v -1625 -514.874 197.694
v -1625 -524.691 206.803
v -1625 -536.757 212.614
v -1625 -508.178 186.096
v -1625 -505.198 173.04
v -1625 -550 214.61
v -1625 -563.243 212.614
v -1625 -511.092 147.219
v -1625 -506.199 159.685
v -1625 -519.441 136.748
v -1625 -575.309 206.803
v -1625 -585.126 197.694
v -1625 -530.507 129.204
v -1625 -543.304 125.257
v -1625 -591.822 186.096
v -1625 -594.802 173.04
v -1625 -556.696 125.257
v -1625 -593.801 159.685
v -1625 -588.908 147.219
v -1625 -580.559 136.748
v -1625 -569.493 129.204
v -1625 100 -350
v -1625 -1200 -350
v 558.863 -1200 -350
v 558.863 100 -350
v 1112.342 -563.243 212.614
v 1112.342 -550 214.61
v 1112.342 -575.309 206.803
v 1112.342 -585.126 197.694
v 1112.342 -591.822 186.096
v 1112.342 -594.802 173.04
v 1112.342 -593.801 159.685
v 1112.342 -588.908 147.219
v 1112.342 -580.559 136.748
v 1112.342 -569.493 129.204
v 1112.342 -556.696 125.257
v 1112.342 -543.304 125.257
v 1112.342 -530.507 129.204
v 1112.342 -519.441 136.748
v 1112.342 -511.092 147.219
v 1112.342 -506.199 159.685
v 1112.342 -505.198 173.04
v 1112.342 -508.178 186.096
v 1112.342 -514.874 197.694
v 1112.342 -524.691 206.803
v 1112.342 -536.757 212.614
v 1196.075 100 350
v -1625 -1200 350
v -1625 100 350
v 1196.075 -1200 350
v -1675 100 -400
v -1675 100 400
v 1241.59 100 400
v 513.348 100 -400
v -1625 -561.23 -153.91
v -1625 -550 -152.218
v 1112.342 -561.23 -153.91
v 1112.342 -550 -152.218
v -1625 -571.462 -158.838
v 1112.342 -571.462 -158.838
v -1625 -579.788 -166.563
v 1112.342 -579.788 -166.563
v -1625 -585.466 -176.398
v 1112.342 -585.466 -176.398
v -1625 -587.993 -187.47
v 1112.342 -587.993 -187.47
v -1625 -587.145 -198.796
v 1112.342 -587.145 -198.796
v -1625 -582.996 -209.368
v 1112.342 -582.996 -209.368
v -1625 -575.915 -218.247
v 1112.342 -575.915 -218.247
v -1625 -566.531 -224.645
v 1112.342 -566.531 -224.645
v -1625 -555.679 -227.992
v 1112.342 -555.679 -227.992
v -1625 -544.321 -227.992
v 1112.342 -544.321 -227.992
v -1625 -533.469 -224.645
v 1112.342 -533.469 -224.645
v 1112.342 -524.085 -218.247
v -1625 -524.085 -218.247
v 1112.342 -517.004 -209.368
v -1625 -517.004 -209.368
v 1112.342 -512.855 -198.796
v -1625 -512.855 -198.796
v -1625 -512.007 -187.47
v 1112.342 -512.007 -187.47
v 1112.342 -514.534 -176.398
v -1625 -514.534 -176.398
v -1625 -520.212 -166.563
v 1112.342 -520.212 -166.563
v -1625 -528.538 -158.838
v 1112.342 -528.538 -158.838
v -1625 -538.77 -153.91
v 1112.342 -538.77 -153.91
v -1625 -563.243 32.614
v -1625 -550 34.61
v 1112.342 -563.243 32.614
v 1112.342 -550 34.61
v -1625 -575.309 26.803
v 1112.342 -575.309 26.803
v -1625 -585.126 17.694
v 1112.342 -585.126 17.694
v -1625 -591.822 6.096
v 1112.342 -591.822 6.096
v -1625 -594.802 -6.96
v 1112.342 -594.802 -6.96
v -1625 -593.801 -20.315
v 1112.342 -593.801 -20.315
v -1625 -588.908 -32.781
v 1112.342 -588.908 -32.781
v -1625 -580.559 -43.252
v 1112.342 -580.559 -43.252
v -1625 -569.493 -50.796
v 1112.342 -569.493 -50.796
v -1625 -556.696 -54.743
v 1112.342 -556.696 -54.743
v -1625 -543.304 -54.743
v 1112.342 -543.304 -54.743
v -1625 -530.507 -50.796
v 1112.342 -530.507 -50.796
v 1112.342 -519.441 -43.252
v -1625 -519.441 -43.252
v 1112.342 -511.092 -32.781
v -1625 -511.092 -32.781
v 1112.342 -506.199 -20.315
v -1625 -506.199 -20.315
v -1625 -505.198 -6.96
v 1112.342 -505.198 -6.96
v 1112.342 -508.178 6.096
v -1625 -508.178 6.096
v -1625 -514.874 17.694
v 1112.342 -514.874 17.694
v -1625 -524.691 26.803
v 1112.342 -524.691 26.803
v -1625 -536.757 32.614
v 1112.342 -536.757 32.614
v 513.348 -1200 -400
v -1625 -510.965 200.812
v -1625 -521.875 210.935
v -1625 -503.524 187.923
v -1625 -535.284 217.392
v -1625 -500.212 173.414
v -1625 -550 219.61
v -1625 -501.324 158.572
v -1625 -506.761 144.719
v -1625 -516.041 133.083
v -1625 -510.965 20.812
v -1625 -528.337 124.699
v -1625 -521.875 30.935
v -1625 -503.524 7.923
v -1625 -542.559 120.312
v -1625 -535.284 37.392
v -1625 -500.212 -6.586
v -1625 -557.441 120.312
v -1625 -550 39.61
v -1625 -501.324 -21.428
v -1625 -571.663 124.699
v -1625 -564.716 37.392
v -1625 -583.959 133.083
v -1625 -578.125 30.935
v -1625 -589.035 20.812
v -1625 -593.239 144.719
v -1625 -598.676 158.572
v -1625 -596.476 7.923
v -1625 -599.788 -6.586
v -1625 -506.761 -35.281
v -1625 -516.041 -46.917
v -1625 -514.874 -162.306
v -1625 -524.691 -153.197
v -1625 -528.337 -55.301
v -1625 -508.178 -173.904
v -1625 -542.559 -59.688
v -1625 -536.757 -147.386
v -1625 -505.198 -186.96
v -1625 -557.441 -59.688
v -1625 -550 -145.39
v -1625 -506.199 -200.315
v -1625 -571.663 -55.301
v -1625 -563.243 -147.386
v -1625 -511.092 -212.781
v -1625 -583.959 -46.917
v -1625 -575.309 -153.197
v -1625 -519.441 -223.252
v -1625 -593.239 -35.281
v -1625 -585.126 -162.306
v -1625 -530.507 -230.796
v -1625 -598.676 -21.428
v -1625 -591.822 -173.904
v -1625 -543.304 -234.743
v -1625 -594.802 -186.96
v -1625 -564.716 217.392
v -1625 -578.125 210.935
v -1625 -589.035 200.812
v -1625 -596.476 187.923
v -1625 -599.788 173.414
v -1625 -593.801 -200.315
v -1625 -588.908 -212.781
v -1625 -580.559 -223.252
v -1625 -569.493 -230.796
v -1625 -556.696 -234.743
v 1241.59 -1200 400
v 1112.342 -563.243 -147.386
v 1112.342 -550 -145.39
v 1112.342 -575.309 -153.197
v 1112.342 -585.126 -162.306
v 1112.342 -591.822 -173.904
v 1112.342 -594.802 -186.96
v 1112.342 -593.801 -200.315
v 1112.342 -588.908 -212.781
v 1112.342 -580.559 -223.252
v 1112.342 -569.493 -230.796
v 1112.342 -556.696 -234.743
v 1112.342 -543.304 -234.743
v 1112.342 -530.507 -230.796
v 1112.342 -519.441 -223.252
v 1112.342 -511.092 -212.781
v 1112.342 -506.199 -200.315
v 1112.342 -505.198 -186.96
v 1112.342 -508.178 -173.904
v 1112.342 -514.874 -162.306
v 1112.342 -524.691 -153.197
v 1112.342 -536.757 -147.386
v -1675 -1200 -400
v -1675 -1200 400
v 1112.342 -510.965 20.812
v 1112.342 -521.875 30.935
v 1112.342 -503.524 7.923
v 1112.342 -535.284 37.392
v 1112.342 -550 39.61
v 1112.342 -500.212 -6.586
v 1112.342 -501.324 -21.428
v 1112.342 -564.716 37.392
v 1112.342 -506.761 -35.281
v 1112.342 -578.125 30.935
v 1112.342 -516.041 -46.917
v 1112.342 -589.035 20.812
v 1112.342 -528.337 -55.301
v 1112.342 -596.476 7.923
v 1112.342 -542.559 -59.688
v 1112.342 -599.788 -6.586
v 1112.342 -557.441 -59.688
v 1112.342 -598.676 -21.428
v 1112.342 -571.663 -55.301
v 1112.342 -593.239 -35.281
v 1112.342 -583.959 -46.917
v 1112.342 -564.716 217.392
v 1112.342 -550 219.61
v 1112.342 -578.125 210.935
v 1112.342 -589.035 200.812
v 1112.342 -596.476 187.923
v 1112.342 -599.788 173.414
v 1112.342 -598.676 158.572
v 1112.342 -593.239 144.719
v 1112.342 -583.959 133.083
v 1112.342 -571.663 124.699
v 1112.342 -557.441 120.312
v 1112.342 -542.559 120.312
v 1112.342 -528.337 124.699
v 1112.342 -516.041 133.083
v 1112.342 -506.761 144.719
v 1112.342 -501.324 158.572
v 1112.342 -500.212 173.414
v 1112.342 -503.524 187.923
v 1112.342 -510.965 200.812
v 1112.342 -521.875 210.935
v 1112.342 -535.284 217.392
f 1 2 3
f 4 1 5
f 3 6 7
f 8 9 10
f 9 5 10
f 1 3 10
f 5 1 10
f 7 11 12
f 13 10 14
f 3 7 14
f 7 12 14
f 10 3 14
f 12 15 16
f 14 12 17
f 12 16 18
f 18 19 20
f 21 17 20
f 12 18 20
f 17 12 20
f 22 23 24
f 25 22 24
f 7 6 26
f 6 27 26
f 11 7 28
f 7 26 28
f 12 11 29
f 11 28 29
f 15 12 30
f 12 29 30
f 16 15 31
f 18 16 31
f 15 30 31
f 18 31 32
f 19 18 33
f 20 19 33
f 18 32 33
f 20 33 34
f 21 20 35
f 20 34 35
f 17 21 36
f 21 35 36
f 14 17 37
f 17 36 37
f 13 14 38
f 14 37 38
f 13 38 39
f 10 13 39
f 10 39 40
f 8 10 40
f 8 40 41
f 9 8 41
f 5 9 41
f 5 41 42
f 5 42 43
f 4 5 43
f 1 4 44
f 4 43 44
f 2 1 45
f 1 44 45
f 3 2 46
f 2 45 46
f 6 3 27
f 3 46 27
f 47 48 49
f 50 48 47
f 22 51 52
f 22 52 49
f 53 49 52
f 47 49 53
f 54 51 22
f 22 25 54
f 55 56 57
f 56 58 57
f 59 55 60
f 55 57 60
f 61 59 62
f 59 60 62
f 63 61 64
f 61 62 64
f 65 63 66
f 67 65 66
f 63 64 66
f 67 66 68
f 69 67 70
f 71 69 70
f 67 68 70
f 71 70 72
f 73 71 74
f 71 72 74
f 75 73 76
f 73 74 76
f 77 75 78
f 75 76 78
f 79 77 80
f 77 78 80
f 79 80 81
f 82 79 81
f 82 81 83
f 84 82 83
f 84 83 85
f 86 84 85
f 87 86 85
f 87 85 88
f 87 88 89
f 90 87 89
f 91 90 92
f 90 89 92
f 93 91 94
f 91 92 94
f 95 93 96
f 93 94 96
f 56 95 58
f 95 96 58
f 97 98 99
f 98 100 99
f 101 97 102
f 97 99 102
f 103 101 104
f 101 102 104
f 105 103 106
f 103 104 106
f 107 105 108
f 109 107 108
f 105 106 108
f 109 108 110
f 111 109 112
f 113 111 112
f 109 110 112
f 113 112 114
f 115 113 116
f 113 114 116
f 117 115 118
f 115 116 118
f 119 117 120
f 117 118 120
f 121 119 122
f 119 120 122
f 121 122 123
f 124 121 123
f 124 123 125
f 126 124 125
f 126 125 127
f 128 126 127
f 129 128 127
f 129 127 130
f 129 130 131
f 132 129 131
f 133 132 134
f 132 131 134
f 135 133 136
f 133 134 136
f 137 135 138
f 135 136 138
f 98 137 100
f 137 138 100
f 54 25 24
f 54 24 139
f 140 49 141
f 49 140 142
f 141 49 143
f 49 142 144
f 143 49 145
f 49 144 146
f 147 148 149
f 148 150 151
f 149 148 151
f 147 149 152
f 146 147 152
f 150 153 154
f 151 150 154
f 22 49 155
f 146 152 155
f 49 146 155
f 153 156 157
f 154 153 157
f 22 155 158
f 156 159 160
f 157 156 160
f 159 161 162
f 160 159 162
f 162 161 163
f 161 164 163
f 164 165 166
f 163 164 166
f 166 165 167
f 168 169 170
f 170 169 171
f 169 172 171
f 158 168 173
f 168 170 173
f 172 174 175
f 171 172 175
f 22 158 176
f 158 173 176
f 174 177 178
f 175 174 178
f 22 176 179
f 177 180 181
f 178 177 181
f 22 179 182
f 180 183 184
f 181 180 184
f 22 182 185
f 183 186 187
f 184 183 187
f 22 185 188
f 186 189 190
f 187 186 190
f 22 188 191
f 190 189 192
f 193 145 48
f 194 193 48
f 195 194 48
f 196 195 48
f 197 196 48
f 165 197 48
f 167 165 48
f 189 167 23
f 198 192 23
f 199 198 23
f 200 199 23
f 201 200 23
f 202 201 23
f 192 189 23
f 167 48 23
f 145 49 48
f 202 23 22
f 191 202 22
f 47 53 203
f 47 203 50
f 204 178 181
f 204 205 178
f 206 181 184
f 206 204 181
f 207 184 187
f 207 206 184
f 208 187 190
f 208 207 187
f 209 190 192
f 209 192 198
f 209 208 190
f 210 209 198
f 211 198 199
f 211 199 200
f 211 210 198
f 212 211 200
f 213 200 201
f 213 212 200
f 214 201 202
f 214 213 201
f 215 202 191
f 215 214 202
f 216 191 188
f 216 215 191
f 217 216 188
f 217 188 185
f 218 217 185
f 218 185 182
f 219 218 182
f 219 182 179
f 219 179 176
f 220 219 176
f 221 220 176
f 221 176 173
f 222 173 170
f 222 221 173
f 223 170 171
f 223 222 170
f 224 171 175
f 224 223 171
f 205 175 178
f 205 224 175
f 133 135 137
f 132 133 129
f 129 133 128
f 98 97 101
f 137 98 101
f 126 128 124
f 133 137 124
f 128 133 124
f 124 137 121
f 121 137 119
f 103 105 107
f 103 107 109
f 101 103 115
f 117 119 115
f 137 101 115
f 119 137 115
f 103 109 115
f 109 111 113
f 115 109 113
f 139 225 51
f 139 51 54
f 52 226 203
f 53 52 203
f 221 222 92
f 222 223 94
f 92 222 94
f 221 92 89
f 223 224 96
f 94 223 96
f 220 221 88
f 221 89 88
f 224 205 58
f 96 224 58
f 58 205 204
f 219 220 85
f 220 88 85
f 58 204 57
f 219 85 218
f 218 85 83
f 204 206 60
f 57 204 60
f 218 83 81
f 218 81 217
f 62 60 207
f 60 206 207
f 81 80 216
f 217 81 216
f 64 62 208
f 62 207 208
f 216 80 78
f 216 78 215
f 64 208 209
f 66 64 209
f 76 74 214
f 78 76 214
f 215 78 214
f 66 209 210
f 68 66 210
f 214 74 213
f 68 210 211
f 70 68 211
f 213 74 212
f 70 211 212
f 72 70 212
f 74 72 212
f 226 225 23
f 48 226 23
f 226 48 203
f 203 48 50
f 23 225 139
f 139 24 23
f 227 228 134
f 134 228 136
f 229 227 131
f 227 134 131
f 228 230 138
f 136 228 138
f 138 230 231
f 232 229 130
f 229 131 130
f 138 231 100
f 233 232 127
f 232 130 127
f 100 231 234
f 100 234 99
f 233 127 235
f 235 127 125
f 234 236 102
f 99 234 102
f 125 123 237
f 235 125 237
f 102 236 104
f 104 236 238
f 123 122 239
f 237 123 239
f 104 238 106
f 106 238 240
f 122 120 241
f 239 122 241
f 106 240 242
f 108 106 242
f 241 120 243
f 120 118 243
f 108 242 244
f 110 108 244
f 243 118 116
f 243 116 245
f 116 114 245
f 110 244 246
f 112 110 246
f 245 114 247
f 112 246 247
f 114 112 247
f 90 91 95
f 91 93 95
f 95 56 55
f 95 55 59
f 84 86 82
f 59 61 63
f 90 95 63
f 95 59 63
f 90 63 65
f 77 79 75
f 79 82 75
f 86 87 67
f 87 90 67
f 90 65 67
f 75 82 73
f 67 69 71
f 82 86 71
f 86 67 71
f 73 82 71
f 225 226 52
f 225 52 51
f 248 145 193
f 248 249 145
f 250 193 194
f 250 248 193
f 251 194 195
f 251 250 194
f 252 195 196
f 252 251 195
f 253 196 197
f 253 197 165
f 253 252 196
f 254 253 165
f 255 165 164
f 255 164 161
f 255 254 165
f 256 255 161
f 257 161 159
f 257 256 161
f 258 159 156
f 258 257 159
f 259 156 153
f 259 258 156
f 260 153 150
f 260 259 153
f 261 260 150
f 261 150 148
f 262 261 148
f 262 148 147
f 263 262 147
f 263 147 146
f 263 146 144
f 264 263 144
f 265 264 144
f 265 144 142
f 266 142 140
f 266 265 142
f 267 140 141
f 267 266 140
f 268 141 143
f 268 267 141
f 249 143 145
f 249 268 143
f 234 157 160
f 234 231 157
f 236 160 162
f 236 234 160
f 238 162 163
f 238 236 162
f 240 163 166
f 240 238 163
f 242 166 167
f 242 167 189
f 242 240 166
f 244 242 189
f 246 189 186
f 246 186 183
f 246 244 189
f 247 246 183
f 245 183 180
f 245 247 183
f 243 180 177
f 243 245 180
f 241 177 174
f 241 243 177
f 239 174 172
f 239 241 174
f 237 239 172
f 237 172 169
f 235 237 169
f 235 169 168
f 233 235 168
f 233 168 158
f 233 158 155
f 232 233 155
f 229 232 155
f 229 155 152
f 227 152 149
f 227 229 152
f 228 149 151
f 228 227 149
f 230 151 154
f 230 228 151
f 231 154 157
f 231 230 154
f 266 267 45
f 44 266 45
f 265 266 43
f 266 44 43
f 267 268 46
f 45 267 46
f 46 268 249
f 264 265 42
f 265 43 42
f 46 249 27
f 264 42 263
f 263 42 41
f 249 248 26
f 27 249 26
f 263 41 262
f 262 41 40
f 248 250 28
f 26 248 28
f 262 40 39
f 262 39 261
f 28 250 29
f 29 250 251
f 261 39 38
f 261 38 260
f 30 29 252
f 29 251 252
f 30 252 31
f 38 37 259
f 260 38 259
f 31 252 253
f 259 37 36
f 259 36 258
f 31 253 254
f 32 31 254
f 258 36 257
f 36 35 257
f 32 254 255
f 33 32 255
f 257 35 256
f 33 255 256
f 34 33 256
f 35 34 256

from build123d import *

# Parameters (mm, degrees)
SALIENTE_EXTRUIR1_DEPTH      = 100
SALIENTE_EXTRUIR1_DEPTH_BACK = 1200
CROQUIS1_W                   = 3350
CROQUIS1_H                   = 800
CROQUIS1_W_2                 = 3250
CROQUIS1_H_2                 = 700
CORTAR_EXTRUIR1_DEPTH        = 1448
CROQUIS3_R                   = 44.927583668
CROQUIS3_R_2                 = 38.1
CROQUIS3_R_3                 = 49.927583668


with BuildPart() as part:
    # Croquis1 → Saliente-Extruir1 (new, two sides: drawn at the far end of the back side and taken through both)
    with BuildSketch(Plane(origin=(0, 0, 0), x_dir=(1, 0, 0), z_dir=(0, 1, 0)).offset(-SALIENTE_EXTRUIR1_DEPTH_BACK)):
        Rectangle(CROQUIS1_W, CROQUIS1_H)
        Rectangle(CROQUIS1_W_2, CROQUIS1_H_2, mode=Mode.SUBTRACT)
    extrude(amount=SALIENTE_EXTRUIR1_DEPTH + SALIENTE_EXTRUIR1_DEPTH_BACK)

    # Croquis2 → Cortar-Extruir1 (cut)
    with BuildSketch(Plane(origin=(0, 100, 0), x_dir=(1, 0, 0), z_dir=(0, 1, 0))):
        Polygon((1241.59041613, -400), (513.347548089, 400), (1675, 400), (1675, -400), align=None)
    extrude(amount=-CORTAR_EXTRUIR1_DEPTH, mode=Mode.SUBTRACT)

    # Barrer1: sweep along a curve in space
    with BuildLine() as barrer1_path:
        Line((-1675, -550, 169.682408269), (1112.341688093, -550, 169.682408269))
    # Croquis3 → Barrer1 (sweep)
    # profile 1 of 3: a face of its own
    with BuildSketch(Plane.ZY.offset(1675)):
        with Locations((-190.317591731, -550)):
            Circle(CROQUIS3_R)
        with Locations((-190.317591731, -550)):
            Circle(CROQUIS3_R_2, mode=Mode.SUBTRACT)
    # profile 2 of 3: a face of its own
    with BuildSketch(Plane.ZY.offset(1675)):
        with Locations((-10.317591731, -550)):
            Circle(CROQUIS3_R_3)
        with Locations((-10.317591731, -550)):
            Circle(CROQUIS3_R, mode=Mode.SUBTRACT)
    # profile 3 of 3: a face of its own
    with BuildSketch(Plane.ZY.offset(1675)):
        with Locations((169.682408269, -550)):
            Circle(CROQUIS3_R_3)
        with Locations((169.682408269, -550)):
            Circle(CROQUIS3_R, mode=Mode.SUBTRACT)
    sweep(path=barrer1_path.line)


solid = part.part
